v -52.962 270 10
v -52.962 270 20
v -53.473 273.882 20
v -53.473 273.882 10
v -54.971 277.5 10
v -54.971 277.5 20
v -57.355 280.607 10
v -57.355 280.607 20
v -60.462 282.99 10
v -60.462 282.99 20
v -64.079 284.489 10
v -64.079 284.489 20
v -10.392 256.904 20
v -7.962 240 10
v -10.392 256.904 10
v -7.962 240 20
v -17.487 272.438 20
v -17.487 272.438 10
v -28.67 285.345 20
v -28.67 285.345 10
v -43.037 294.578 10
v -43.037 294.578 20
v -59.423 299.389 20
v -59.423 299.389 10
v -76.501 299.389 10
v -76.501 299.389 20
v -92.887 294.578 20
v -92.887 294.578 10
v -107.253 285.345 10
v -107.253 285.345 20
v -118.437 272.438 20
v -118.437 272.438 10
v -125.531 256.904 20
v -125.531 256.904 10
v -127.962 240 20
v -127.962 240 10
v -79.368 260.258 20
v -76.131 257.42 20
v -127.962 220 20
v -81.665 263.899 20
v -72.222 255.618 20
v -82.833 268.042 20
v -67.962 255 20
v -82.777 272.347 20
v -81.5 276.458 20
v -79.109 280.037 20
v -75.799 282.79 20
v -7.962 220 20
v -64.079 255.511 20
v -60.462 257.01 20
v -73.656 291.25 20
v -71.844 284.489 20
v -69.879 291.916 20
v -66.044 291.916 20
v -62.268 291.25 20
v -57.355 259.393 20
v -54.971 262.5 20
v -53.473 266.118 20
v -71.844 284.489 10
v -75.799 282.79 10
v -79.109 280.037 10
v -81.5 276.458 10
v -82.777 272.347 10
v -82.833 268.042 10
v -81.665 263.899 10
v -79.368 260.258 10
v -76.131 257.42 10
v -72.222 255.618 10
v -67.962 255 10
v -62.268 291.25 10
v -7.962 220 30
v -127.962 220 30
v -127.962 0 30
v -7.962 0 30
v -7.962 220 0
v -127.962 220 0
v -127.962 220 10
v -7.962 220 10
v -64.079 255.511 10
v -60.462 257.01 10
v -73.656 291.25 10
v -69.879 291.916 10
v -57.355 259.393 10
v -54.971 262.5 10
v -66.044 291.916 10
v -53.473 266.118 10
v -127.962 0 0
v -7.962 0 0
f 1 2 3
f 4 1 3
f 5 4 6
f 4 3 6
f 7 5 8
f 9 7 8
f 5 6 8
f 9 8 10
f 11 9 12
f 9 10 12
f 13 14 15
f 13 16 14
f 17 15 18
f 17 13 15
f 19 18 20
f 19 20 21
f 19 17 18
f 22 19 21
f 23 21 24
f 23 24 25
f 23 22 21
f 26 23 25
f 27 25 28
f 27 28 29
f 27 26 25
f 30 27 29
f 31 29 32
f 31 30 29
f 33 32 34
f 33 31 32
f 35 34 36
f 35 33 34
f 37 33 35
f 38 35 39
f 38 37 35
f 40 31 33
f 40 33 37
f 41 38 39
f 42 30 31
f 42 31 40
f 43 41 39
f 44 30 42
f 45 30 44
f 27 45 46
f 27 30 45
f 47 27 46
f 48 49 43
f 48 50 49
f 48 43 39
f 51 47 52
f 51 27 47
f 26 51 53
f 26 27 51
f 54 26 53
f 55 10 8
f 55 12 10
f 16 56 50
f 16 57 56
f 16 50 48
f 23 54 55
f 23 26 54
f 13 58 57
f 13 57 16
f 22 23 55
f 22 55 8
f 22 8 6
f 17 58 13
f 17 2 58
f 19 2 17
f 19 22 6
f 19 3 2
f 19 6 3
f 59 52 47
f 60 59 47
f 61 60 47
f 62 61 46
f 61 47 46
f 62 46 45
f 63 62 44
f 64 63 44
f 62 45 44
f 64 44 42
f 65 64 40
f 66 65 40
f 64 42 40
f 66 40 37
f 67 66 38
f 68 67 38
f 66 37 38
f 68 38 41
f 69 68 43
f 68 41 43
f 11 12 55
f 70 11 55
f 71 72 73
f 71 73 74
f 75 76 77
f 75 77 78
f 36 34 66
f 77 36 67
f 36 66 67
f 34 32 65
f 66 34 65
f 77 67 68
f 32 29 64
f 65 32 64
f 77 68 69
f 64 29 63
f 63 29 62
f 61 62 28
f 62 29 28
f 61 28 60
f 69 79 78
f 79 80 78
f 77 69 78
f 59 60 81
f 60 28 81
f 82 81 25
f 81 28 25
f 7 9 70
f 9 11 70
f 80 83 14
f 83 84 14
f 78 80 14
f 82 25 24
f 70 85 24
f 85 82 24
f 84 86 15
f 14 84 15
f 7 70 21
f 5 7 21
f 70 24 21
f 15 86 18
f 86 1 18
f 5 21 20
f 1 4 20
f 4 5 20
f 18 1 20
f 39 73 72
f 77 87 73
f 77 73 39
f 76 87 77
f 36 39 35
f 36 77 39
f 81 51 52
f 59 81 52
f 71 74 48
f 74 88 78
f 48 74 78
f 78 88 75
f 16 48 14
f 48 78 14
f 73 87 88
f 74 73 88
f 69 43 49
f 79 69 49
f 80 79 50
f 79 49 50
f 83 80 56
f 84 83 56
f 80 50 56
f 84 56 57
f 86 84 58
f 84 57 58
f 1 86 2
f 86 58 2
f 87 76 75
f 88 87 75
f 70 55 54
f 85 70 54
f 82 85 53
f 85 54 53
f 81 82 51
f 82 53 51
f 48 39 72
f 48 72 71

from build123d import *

# Parameters (mm, degrees)
SKETCH_1_W          = 120
SKETCH_1_H          = 240
EXTRUDE_1_DEPTH     = 30
SKETCH_6_W          = 120
SKETCH_6_H          = 10
CUT_EXTRUDE_2_DEPTH = 20
EXTRUDE_4_DEPTH     = 10
CUT_EXTRUDE_3_DEPTH = 327.763219646


with BuildPart() as part:
    # 草图1 → 凸台-拉伸1 (new body)
    with BuildSketch(Plane.XY):
        with Locations((-67.961719718, 120)):
            Rectangle(SKETCH_1_W, SKETCH_1_H)
    extrude(amount=EXTRUDE_1_DEPTH)

    # 草图6 → 切除-拉伸2 (cut)
    with BuildSketch(Plane(origin=(0, 240, 0), x_dir=(1, 0, 0), z_dir=(0, 1, 0))):
        with Locations((-67.961719718, -5)):
            Rectangle(SKETCH_6_W, SKETCH_6_H)
        with Locations((-67.961719718, -25)):
            Rectangle(SKETCH_6_W, SKETCH_6_H)
    extrude(amount=-CUT_EXTRUDE_2_DEPTH, mode=Mode.SUBTRACT)

    # 草图7 → 凸台-拉伸4 (add)
    with BuildSketch(Plane.XY.offset(20)):
        with BuildLine():
            ThreePointArc((-7.961719718, 240), (-67.961719718, 300), (-127.961719718, 240))
            Line((-127.961719718, 240), (-7.961719718, 240))
        make_face()
        with BuildLine():
            Line((-7.961719718, 240), (-127.961719718, 240))
            ThreePointArc((-127.961719718, 240), (-67.961719718, 180), (-7.961719718, 240))
        make_face()
    extrude(amount=-EXTRUDE_4_DEPTH)

    # 草图8 → 切除-拉伸3 (cut, through all)
    with BuildSketch(Plane.XY.offset(20)):
        with BuildLine():
            ThreePointArc((-62.267700726, 291.250368178), (-67.961719718, 292), (-73.65573871, 291.250368178))
            Line((-73.65573871, 291.250368178), (-71.844005395, 284.488887394))
            ThreePointArc((-71.844005395, 284.488887394), (-67.961719718, 285), (-64.079434042, 284.488887394))
            Line((-64.079434042, 284.488887394), (-62.267700726, 291.250368178))
        make_face()
        with BuildLine():
            Line((-71.844005395, 284.488887394), (-67.961719718, 270))
            Line((-67.961719718, 270), (-64.079434042, 284.488887394))
            ThreePointArc((-64.079434042, 284.488887394), (-67.961719718, 285), (-71.844005395, 284.488887394))
        make_face()
        with BuildLine():
            Line((-67.961719718, 270), (-67.961719718, 255))
            ThreePointArc((-67.961719718, 255), (-57.355118, 259.393398282), (-52.961719718, 270))
            ThreePointArc((-52.961719718, 270), (-56.061419614, 279.131421435), (-64.079434042, 284.488887394))
            Line((-64.079434042, 284.488887394), (-67.961719718, 270))
        make_face()
        with BuildLine():
            ThreePointArc((-71.844005395, 284.488887394), (-82.833392639, 268.042107117), (-67.961719718, 255))
            Line((-67.961719718, 255), (-67.961719718, 270))
            Line((-67.961719718, 270), (-71.844005395, 284.488887394))
        make_face()
    extrude(amount=-CUT_EXTRUDE_3_DEPTH, mode=Mode.SUBTRACT)


solid = part.part
